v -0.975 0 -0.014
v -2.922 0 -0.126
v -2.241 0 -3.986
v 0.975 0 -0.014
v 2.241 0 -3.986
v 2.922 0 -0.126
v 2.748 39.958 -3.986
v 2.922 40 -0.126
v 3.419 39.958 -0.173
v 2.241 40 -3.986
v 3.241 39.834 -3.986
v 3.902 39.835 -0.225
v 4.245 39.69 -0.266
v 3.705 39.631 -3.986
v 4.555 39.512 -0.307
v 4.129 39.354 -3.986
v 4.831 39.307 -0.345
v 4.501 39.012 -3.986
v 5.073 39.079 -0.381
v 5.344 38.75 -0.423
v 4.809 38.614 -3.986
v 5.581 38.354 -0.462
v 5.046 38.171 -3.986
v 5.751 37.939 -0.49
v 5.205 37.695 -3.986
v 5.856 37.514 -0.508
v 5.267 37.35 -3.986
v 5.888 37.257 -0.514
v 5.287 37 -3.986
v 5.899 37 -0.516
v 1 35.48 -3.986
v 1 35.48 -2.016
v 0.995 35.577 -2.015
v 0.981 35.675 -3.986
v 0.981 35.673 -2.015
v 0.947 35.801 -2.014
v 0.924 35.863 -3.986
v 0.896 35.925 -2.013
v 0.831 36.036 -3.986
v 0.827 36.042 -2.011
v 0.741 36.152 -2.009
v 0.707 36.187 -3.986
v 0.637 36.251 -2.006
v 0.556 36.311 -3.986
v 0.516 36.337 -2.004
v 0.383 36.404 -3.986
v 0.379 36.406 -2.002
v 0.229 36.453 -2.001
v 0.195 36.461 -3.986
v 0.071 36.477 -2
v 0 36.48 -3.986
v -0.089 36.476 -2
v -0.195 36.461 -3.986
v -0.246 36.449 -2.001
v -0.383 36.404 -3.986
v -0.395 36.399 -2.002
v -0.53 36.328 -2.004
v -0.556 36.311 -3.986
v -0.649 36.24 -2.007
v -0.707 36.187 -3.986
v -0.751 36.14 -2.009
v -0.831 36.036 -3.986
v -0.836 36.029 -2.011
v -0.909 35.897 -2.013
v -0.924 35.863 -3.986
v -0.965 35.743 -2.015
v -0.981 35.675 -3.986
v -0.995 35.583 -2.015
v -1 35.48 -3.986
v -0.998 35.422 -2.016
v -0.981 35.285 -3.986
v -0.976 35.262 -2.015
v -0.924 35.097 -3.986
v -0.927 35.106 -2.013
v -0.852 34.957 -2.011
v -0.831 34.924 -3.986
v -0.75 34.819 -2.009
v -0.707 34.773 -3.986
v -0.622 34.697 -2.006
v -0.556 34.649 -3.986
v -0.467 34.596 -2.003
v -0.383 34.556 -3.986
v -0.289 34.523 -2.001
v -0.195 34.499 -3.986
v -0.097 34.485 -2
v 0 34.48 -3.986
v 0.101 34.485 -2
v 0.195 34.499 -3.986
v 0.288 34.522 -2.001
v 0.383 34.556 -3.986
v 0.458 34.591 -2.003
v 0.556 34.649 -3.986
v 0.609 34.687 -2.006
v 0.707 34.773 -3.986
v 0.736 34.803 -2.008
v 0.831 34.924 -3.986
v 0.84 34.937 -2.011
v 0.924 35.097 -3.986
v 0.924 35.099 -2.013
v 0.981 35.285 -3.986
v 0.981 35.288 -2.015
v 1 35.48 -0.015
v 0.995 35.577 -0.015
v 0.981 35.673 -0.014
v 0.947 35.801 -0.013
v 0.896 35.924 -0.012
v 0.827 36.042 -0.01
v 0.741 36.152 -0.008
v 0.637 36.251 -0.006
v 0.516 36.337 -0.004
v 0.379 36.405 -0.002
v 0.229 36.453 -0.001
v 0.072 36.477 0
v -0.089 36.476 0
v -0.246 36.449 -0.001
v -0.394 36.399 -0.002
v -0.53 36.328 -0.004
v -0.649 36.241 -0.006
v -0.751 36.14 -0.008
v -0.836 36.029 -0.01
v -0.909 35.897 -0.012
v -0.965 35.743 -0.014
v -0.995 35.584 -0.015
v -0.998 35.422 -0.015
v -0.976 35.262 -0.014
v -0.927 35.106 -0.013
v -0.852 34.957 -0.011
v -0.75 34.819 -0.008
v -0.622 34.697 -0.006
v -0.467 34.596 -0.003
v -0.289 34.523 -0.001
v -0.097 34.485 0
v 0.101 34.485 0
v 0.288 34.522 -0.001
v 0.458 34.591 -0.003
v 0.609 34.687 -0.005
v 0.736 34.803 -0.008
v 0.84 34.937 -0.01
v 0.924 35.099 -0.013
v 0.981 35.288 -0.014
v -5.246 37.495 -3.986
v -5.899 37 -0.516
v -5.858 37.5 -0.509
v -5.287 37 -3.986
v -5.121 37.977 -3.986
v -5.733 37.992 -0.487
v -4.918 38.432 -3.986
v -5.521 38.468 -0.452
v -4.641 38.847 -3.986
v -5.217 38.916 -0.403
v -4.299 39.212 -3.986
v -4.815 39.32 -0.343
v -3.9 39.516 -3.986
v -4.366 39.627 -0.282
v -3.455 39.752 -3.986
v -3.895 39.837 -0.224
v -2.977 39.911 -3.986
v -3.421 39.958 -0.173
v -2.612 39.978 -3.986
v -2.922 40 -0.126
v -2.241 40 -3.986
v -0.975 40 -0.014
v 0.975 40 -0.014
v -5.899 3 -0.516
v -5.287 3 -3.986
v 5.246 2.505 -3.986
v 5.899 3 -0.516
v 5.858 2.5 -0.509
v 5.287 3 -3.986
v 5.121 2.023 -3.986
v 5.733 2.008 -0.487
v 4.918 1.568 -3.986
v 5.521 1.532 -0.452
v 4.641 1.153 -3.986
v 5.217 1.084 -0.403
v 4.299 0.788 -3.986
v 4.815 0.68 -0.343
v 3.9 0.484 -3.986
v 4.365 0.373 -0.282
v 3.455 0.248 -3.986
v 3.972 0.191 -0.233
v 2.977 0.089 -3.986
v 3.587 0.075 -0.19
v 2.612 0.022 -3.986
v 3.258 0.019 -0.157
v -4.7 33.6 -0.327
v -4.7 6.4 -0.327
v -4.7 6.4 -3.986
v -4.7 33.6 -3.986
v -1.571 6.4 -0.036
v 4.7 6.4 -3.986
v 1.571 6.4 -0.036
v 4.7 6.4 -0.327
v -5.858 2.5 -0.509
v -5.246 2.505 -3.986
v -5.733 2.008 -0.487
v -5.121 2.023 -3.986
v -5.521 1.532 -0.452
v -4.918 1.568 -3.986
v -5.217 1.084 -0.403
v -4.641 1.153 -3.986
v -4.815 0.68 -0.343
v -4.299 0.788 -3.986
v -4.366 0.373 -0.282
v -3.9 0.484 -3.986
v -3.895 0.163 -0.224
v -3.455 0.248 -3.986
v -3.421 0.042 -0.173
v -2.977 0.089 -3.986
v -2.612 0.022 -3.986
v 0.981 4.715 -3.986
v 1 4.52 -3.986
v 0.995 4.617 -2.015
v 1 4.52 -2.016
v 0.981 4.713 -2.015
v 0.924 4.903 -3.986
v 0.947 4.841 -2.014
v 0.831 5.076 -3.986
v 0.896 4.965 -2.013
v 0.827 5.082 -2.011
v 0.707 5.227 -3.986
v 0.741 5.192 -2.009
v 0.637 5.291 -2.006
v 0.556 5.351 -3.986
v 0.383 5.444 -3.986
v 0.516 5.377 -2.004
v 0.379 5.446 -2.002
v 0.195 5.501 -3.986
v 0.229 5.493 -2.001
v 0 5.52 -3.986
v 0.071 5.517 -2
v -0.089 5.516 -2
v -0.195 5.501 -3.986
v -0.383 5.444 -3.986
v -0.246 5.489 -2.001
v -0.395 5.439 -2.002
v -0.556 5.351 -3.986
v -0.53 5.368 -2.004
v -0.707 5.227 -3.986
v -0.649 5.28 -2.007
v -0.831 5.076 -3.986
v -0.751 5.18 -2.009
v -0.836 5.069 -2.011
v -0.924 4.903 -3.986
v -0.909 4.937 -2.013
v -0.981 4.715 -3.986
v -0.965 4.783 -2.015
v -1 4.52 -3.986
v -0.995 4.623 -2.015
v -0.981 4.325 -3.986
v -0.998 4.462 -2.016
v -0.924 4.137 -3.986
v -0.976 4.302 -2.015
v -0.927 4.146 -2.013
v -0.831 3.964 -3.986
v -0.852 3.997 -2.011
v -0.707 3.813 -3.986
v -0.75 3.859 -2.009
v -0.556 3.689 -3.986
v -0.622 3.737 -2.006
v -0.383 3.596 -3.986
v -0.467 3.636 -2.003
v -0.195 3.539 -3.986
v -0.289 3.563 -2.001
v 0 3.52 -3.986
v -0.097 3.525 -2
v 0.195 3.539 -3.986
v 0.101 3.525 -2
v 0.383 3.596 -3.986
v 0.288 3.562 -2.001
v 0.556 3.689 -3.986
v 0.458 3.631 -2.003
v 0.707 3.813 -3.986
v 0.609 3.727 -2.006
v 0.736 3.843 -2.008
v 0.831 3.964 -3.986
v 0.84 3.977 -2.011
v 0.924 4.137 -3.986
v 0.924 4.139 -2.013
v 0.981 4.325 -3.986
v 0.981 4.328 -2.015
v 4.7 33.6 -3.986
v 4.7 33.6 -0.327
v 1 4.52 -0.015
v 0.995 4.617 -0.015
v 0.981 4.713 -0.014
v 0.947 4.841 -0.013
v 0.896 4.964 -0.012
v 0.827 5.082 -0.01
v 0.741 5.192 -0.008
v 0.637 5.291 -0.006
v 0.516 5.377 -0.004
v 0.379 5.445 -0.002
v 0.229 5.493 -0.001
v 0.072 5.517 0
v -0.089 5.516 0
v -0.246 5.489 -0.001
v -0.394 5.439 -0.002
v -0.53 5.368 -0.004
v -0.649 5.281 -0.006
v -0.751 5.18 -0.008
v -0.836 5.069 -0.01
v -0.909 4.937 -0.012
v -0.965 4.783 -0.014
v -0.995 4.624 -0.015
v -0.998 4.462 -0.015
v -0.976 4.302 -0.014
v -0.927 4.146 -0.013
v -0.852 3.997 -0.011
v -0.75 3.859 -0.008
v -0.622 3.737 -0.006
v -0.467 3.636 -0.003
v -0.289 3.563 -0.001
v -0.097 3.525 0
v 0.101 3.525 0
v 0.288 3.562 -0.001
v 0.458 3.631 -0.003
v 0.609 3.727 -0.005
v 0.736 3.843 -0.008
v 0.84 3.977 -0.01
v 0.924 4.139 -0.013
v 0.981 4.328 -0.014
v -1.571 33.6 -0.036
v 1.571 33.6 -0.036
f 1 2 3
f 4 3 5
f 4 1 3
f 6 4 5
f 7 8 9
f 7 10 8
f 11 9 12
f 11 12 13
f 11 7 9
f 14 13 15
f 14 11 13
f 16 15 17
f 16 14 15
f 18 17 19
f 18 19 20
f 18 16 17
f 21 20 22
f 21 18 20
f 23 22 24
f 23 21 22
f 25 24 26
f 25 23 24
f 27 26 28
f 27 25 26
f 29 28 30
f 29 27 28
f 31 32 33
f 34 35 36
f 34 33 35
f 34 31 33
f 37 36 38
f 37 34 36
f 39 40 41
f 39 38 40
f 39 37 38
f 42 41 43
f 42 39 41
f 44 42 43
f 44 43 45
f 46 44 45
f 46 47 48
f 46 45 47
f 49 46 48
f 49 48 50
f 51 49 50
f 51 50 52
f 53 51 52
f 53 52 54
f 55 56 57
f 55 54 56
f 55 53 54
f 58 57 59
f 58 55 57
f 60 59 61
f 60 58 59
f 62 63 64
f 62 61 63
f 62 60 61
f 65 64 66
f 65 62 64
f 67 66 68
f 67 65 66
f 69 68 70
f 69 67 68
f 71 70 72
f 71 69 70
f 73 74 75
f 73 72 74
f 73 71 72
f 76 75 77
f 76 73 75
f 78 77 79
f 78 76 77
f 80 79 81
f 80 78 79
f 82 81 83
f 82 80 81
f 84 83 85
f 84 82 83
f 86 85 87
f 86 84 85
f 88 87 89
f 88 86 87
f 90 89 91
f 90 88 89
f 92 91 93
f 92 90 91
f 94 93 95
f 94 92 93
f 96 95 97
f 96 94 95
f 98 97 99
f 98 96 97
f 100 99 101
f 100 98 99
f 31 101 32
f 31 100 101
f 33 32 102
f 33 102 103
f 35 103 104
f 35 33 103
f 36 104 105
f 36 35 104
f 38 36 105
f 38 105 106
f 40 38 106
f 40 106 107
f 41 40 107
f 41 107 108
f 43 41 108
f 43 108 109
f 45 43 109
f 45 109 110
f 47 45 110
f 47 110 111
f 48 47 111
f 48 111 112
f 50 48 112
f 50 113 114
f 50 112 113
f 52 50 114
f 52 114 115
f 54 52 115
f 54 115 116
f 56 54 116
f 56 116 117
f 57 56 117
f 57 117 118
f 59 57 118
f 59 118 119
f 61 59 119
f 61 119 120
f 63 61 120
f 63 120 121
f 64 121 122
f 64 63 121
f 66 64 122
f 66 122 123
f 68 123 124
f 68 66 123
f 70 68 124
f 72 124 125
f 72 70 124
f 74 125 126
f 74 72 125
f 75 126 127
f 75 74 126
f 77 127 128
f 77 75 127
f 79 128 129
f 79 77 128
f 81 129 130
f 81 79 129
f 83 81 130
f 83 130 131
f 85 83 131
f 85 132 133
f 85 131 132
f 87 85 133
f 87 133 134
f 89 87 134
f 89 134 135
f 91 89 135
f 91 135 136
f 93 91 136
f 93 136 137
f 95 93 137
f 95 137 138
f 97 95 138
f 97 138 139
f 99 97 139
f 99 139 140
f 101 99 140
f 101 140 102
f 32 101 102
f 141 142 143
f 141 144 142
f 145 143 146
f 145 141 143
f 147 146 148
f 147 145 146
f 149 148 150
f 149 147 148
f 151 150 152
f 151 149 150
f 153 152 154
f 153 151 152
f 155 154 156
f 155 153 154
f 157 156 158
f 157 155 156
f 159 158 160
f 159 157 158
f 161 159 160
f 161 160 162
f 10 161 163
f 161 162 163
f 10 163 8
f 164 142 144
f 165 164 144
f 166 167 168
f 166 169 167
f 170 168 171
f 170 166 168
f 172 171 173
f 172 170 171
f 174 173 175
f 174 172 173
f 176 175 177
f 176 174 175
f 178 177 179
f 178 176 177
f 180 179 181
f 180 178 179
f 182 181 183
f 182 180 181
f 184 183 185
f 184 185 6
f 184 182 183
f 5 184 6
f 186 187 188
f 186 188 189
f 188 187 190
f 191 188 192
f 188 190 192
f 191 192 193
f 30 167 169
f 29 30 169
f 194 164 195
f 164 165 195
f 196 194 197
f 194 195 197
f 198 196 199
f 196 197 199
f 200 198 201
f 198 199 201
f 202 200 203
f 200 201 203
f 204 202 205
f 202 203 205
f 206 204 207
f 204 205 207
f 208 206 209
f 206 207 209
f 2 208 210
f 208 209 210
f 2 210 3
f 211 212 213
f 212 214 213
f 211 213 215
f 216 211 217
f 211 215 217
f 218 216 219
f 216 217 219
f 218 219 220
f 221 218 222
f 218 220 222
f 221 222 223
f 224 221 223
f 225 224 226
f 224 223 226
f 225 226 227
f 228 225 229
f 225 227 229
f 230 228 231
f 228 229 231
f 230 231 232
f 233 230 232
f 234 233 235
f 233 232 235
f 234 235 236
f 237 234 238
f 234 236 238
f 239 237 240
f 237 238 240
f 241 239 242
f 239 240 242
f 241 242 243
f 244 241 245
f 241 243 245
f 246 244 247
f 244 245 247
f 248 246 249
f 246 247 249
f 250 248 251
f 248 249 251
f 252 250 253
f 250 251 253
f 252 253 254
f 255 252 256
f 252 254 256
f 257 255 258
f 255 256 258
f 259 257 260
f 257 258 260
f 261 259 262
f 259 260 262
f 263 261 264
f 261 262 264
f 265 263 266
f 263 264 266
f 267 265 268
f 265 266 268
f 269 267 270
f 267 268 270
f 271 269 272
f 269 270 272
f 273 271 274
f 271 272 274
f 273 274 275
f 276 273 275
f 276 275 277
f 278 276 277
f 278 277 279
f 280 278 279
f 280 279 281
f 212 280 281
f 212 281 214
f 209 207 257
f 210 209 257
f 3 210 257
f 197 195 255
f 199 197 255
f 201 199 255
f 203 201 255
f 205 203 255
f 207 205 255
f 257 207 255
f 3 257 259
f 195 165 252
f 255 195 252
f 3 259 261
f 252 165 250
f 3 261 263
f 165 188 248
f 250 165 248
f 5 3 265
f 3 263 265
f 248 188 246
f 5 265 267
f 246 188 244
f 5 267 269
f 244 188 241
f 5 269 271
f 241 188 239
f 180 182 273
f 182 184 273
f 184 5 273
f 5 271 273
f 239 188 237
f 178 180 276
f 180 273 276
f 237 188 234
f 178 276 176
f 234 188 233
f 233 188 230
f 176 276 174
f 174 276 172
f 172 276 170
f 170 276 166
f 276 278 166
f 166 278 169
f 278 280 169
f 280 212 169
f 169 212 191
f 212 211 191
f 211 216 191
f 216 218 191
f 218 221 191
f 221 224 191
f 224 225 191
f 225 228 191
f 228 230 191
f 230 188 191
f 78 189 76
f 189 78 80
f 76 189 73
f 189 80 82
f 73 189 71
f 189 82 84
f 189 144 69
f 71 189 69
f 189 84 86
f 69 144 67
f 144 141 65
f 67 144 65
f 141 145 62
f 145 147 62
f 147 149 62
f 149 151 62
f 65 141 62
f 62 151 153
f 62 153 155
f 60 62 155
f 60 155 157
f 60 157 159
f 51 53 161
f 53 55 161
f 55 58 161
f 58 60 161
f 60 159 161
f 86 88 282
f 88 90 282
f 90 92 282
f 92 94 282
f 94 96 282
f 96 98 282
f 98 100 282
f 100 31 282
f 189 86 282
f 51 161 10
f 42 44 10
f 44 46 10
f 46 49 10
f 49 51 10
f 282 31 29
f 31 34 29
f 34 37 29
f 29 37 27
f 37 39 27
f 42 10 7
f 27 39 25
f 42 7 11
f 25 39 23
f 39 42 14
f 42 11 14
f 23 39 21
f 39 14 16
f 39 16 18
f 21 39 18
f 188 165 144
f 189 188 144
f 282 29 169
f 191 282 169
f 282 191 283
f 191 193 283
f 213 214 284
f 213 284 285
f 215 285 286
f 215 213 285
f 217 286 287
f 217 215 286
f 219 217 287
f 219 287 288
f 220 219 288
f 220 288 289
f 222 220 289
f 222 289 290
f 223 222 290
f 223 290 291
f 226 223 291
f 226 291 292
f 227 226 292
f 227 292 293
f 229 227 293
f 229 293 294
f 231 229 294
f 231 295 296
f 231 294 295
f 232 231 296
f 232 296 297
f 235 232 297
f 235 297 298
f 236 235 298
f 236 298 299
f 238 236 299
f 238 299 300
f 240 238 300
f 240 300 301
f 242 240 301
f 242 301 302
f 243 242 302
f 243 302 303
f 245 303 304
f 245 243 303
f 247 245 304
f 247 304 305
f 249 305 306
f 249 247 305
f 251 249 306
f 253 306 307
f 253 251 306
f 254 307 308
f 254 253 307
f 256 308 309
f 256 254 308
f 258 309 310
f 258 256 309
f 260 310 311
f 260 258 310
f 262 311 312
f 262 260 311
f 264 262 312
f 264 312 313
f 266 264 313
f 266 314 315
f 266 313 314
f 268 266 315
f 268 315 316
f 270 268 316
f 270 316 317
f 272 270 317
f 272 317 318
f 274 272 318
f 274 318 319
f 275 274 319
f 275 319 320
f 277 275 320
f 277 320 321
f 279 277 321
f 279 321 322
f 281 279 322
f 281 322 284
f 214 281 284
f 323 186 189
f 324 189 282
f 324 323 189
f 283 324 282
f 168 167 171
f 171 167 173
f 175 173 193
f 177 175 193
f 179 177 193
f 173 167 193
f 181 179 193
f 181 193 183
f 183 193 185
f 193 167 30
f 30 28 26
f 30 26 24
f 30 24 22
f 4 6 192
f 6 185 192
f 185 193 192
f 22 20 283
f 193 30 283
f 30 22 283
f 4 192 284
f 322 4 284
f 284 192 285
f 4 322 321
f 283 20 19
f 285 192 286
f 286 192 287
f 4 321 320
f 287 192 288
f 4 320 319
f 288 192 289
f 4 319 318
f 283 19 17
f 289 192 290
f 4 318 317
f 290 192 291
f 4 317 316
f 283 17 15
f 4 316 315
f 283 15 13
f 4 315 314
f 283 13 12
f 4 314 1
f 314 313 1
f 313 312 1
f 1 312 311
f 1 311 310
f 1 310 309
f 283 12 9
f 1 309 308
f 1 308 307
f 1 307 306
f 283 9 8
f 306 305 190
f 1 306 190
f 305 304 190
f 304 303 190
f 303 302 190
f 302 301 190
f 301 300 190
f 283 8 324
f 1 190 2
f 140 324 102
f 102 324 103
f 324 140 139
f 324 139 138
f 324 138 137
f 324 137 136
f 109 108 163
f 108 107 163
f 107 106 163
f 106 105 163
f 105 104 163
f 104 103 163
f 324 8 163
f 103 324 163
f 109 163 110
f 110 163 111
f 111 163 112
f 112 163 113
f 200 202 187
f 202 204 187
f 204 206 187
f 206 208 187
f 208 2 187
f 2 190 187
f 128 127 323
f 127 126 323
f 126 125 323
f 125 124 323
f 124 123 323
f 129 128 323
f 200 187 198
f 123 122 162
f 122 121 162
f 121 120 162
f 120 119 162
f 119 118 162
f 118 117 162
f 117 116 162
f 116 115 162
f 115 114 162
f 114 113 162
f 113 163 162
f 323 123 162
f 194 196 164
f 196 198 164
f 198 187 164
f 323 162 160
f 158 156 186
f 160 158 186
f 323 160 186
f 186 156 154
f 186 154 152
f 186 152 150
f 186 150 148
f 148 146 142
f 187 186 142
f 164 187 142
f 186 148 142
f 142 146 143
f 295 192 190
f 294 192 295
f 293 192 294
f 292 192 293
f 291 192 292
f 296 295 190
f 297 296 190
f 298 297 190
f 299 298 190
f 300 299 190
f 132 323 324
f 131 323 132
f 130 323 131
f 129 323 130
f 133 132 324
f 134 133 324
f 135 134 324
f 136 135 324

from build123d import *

# Parameters (mm, degrees)
SKETCH1_W                         = 2
SKETCH1_H                         = 40
BULK_EXTRUDE_ANGLE                = 20
CONNECTOR_PASSTHRU_DEPTH          = 41.509013499
CONNECTOR_PASSTHRU_DEPTH_BACK     = 41.509013499
SKETCH2_R                         = 1
SKETCH2_W                         = 9.4
SKETCH2_H                         = 27.2
REAR_FLATTENING_REACH             = 42.509
SKETCH3_W                         = 11.10393272
SKETCH3_H                         = 40
SKETCH3_R                         = 1
SKETCH3_W_2                       = 9.4
SKETCH3_H_2                       = 27.2
REAR_FLATTENING_DIRECTION_2_DEPTH = 1.5
SKETCH4_W                         = 5.405389312
SKETCH4_H                         = 40
CUT_EXTRUDE2_DEPTH                = 42.783584431
SKETCH5_W                         = 5.359461023
SKETCH5_H                         = 40
CUT_EXTRUDE3_DEPTH                = 42.783584431
FILLET1_R                         = 3


with BuildPart() as part:
    # Sketch1 → BULK EXTRUDE (revolve, symmetric)
    with BuildSketch(Plane(origin=(0, 0, 0), x_dir=(0, 0, -1), z_dir=(1, 0, 0))) as bulk_extrude_sk:
        with Locations((1, 20)):
            Rectangle(SKETCH1_W, SKETCH1_H)
    revolve(axis=Axis((0, 0, -33.9725), (0, 1, 0)), revolution_arc=BULK_EXTRUDE_ANGLE / 2)
    revolve(bulk_extrude_sk.sketch, axis=Axis((0, 0, -33.9725), (0, -1, 0)), revolution_arc=BULK_EXTRUDE_ANGLE / 2)

    # Sketch2 → CONNECTOR PASSTHRU (cut, two sides: drawn at the far end of the back side and taken through both)
    with BuildSketch(Plane.XY.offset(-CONNECTOR_PASSTHRU_DEPTH_BACK)):
        with Locations((0, 4.52)):
            Circle(SKETCH2_R)
        with Locations((0, 35.48)):
            Circle(SKETCH2_R)
        with Locations((0, 20)):
            Rectangle(SKETCH2_W, SKETCH2_H)
    extrude(amount=CONNECTOR_PASSTHRU_DEPTH + CONNECTOR_PASSTHRU_DEPTH_BACK, mode=Mode.SUBTRACT)

    # Sketch3 → REAR FLATTENING (add, up to next)
    with BuildSketch(Plane.XY.offset(-2.485734117), mode=Mode.PRIVATE) as rear_flattening_sk1:
        with Locations((0, 20)):
            Rectangle(SKETCH3_W, SKETCH3_H)
        with Locations((0, 4.52)):
            Circle(SKETCH3_R, mode=Mode.SUBTRACT)
        with Locations((0, 35.48)):
            Circle(SKETCH3_R, mode=Mode.SUBTRACT)
        with Locations((0, 20)):
            Rectangle(SKETCH3_W_2, SKETCH3_H_2, mode=Mode.SUBTRACT)
    rear_flattening_tool1 = extrude(rear_flattening_sk1.sketch, amount=REAR_FLATTENING_REACH, mode=Mode.PRIVATE) - part.part
    add(rear_flattening_tool1.solids().sort_by_distance((0, 0.415126, -2.485734))[0])

    # Sketch3 → REAR FLATTENING direction 2 (add)
    with BuildSketch(Plane.XY.offset(-2.485734117)):
        with Locations((0, 20)):
            Rectangle(SKETCH3_W, SKETCH3_H)
        with Locations((0, 4.52)):
            Circle(SKETCH3_R, mode=Mode.SUBTRACT)
        with Locations((0, 35.48)):
            Circle(SKETCH3_R, mode=Mode.SUBTRACT)
        with Locations((0, 20)):
            Rectangle(SKETCH3_W_2, SKETCH3_H_2, mode=Mode.SUBTRACT)
    extrude(amount=-REAR_FLATTENING_DIRECTION_2_DEPTH)

    # Sketch4 → Cut-Extrude2 (cut, through all)
    with BuildSketch(Plane(origin=(5.80963966, 0, -1.02439622), x_dir=(-0.17364817766693075, 0, -0.9848077530122081), z_dir=(0.9848077530122081, 0, -0.17364817766693075))):
        with Locations((2.186576045, 20)):
            Rectangle(SKETCH4_W, SKETCH4_H)
    extrude(amount=CUT_EXTRUDE2_DEPTH, mode=Mode.SUBTRACT)

    # Sketch5 → Cut-Extrude3 (cut, through all)
    with BuildSketch(Plane(origin=(-5.80963966, 0, -1.02439622), x_dir=(-0.17364817766693072, 0, 0.9848077530122081), z_dir=(-0.9848077530122081, 0, -0.17364817766693072))):
        with Locations((-2.163611901, 20)):
            Rectangle(SKETCH5_W, SKETCH5_H)
    extrude(amount=CUT_EXTRUDE3_DEPTH, mode=Mode.SUBTRACT)

    # Fillet1
    fillet1_edges = [part.edges().sort_by_distance(p)[0] for p in [
        (5.593369303, 40, -2.250926364),
        (-5.593369303, 0, -2.250926364),
        (-5.593369303, 40, -2.250926364),
        (5.593369303, 0, -2.250926364),
    ]]
    fillet(fillet1_edges, radius=FILLET1_R)


solid = part.part
